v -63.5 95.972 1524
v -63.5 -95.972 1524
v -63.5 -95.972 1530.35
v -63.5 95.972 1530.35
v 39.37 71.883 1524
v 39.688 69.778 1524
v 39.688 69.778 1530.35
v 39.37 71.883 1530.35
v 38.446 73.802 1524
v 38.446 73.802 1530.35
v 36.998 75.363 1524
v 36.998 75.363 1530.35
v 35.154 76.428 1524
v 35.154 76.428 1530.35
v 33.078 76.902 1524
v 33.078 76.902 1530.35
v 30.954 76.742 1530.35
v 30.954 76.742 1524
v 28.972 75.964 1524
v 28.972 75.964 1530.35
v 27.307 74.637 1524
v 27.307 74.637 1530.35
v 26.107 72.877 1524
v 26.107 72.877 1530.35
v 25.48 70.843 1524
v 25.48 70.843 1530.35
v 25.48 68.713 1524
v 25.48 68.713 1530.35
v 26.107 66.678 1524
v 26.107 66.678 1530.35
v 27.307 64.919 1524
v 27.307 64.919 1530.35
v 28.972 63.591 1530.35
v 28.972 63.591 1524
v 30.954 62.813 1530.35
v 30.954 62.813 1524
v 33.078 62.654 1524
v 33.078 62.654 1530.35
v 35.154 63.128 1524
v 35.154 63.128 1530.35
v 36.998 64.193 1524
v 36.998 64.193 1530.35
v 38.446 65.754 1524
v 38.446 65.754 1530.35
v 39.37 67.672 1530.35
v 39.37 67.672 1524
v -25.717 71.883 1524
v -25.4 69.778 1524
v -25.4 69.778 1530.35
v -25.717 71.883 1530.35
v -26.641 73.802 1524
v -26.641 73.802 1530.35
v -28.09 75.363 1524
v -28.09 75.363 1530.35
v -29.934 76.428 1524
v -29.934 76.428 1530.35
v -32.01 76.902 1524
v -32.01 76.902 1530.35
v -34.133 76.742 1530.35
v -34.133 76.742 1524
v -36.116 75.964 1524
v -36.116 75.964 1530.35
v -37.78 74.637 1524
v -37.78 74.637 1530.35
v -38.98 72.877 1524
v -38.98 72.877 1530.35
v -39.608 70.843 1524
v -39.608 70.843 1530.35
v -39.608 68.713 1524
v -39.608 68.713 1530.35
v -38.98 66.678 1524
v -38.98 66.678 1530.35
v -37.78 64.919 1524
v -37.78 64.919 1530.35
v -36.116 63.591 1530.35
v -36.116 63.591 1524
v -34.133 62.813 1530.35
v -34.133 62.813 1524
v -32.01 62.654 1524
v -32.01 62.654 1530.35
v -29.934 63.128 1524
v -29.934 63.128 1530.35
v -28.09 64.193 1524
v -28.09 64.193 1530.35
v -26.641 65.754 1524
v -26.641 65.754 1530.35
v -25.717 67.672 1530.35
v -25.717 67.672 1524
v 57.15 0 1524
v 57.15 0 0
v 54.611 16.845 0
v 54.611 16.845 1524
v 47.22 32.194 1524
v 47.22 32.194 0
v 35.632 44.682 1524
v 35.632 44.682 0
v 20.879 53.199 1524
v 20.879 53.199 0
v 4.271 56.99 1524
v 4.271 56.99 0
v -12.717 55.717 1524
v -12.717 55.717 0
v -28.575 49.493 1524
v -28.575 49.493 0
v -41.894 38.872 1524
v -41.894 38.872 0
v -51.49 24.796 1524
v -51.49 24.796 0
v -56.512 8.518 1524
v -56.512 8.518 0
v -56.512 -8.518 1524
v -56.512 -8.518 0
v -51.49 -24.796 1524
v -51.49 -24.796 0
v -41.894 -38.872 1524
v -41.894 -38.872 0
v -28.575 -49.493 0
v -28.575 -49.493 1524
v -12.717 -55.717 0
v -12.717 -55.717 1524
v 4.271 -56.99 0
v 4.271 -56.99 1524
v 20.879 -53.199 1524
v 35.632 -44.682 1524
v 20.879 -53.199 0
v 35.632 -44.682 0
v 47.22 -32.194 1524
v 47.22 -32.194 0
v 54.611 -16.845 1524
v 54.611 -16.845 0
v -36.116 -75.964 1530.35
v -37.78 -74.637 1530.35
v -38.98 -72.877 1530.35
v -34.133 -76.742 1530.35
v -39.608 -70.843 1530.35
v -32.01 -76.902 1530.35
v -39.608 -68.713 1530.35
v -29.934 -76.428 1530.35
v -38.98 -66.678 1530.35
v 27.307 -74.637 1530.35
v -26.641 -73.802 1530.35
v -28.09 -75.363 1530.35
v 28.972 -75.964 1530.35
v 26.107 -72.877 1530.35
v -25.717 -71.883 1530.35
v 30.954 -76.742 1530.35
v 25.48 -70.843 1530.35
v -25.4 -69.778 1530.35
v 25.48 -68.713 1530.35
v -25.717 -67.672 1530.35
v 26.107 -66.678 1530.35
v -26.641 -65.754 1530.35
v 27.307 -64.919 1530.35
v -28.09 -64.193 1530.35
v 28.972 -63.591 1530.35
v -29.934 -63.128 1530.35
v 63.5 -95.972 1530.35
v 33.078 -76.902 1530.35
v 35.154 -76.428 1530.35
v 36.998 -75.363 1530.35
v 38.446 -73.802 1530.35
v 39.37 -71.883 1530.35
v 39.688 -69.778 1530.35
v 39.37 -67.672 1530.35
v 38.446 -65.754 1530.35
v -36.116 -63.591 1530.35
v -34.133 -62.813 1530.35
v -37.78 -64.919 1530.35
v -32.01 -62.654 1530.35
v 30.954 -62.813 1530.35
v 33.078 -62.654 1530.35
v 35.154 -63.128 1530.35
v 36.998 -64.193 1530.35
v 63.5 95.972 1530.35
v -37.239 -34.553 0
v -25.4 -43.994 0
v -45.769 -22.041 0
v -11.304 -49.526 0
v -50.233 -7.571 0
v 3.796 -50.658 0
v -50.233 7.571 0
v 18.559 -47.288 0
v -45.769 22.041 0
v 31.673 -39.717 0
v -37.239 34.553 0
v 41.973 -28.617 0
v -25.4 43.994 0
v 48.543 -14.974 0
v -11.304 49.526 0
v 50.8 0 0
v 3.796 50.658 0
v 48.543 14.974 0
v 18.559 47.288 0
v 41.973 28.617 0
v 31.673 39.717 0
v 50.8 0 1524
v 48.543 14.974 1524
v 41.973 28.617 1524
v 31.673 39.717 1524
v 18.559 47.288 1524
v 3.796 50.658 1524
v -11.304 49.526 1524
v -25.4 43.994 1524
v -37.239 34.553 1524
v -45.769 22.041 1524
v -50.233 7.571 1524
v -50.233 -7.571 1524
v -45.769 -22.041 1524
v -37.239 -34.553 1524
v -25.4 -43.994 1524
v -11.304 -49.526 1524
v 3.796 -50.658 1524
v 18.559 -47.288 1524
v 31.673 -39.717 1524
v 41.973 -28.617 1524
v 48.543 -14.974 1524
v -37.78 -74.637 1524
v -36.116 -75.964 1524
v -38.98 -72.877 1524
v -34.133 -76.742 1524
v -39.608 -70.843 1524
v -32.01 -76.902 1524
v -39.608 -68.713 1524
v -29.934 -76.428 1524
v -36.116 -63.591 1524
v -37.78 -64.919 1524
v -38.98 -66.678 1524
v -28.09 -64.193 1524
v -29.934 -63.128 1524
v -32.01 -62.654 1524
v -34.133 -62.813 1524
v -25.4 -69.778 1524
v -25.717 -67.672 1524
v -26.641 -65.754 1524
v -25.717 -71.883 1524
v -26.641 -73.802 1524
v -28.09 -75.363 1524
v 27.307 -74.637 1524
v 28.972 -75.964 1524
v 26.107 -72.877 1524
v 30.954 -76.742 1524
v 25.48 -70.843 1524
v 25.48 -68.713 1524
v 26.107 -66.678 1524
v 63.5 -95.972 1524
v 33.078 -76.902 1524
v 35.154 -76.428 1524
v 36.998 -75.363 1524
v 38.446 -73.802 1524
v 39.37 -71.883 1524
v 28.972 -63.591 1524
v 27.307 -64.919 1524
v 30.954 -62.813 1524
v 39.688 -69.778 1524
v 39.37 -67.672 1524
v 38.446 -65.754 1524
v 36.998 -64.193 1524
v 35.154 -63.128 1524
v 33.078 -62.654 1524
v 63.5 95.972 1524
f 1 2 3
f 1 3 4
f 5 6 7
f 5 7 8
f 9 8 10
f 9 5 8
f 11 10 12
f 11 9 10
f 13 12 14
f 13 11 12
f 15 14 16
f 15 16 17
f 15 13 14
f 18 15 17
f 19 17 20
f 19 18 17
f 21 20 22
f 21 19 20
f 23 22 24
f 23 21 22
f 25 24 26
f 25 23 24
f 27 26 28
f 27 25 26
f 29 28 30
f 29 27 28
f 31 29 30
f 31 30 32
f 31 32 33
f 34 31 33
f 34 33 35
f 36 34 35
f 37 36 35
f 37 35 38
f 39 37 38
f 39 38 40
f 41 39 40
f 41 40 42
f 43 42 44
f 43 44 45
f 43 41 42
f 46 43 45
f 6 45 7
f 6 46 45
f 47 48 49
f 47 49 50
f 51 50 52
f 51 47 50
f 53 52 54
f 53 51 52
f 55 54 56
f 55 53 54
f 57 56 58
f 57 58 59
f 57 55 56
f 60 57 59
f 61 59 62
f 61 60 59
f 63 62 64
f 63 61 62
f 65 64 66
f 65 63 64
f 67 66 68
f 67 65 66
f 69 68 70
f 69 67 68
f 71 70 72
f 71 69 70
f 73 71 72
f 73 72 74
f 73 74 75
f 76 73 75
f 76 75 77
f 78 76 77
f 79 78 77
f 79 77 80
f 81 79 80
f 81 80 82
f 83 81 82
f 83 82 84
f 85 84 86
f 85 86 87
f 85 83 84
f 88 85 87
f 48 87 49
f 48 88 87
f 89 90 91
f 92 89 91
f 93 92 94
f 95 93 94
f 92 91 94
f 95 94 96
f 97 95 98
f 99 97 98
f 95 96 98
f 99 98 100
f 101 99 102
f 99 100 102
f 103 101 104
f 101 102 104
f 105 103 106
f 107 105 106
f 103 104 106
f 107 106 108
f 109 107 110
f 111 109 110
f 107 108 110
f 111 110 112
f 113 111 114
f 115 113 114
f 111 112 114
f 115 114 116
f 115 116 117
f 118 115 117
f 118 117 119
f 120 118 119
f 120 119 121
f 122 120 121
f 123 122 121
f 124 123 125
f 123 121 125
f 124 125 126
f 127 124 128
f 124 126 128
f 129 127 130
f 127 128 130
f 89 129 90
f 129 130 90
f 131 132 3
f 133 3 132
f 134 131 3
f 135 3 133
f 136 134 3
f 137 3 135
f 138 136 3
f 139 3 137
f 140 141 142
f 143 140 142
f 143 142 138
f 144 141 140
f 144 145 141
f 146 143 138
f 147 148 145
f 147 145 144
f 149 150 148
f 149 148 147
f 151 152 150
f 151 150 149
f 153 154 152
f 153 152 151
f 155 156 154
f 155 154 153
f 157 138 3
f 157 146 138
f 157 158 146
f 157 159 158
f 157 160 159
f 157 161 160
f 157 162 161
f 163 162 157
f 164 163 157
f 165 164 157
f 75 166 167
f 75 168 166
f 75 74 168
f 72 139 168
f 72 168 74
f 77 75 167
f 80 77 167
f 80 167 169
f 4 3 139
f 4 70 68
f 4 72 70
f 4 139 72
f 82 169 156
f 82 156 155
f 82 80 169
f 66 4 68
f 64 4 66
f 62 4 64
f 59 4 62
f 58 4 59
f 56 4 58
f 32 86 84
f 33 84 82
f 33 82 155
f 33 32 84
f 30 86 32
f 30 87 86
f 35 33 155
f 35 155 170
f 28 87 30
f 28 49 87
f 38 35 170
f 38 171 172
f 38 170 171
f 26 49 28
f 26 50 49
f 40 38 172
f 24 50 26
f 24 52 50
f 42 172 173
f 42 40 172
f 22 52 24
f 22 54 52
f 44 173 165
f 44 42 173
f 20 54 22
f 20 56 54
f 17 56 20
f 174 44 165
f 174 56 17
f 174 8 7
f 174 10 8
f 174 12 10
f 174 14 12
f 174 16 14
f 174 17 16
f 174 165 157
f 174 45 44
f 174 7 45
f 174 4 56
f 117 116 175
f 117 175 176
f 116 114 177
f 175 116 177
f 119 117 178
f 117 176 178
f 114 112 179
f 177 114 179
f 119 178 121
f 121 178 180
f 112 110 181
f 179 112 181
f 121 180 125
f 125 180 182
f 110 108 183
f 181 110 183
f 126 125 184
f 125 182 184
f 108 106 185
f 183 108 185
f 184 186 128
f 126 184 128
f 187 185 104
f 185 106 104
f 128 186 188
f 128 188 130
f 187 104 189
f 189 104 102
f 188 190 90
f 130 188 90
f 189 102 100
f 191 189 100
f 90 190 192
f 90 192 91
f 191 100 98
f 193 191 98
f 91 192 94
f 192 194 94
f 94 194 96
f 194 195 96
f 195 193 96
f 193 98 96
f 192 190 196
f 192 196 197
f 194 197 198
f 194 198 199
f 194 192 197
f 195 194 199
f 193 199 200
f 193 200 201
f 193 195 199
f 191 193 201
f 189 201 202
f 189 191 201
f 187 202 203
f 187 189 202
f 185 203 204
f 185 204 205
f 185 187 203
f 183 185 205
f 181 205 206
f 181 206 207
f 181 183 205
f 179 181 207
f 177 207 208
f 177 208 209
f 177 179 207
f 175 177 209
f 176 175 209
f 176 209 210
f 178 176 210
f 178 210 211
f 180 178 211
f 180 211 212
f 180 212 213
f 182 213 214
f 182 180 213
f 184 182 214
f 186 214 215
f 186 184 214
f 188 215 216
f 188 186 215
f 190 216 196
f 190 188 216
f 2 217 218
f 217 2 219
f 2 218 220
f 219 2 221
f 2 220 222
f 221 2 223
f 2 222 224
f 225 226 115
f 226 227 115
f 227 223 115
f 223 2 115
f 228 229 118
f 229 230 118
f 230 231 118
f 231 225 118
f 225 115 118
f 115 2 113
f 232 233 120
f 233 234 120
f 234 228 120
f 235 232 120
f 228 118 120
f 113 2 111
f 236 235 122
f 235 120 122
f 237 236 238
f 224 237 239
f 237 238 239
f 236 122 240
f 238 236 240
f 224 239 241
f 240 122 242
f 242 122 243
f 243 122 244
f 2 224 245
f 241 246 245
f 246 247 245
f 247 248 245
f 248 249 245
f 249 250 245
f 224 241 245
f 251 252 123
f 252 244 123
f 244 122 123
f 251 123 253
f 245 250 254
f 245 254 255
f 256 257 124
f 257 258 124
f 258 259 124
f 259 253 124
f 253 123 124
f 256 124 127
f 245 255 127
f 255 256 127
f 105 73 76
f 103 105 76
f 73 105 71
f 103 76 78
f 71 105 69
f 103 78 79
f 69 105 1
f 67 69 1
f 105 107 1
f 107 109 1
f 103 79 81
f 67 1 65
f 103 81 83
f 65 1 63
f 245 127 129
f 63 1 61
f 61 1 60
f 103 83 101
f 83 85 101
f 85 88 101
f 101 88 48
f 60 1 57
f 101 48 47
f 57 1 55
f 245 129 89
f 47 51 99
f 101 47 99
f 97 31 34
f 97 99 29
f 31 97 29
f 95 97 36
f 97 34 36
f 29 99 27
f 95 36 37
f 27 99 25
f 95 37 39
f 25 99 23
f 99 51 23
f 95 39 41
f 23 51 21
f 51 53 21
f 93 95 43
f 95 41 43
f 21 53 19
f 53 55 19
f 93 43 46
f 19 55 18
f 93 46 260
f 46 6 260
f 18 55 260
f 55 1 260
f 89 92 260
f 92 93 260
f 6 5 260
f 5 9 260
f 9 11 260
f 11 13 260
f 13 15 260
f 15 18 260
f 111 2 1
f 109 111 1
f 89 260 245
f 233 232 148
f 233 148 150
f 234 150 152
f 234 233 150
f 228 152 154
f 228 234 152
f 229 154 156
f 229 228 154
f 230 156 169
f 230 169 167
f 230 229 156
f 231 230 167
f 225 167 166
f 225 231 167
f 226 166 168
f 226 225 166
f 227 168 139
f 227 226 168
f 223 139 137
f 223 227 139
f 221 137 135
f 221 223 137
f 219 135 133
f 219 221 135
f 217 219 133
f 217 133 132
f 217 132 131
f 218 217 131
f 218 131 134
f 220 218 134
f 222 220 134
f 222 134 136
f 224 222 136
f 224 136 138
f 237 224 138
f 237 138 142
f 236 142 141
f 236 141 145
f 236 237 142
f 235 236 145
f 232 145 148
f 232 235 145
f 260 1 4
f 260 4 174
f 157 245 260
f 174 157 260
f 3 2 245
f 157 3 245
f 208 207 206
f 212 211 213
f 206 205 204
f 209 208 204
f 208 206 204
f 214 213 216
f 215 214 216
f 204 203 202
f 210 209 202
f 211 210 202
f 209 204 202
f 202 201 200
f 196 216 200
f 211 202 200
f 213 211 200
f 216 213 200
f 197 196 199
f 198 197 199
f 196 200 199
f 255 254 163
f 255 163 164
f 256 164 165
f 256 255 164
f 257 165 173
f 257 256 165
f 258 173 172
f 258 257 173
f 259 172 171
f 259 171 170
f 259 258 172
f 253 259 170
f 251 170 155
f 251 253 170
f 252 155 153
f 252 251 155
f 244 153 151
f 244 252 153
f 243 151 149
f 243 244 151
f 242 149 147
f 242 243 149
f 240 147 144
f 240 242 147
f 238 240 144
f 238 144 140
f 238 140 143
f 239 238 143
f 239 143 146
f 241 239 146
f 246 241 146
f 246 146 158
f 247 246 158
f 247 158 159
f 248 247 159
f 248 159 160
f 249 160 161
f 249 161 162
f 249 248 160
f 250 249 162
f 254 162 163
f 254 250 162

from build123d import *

# Parameters (mm, degrees)
F0_R     = 57.15
F0_R_2   = 50.8
F1_DEPTH = 1524
F2_W     = 127
F2_H     = 191.943108
F2_R     = 7.14375
F3_DEPTH = 6.35


with BuildPart() as f1:
    # F0 (on Top) → F1 (new body)
    with BuildSketch(Plane.XY):
        Circle(F0_R)
        Circle(F0_R_2, mode=Mode.SUBTRACT)
    extrude(amount=F1_DEPTH)

    # F2 (on face) → F3 (join)
    with BuildSketch(Plane.XY.offset(1524)):
        Rectangle(F2_W, F2_H)
        with Locations((-32.54375, -69.777804)):
            Circle(F2_R, mode=Mode.SUBTRACT)
        with Locations((32.54375, -69.777804)):
            Circle(F2_R, mode=Mode.SUBTRACT)
        with Locations((-32.54375, 69.777804)):
            Circle(F2_R, mode=Mode.SUBTRACT)
        with Locations((32.54375, 69.777804)):
            Circle(F2_R, mode=Mode.SUBTRACT)
    extrude(amount=F3_DEPTH)


solid = f1.part
